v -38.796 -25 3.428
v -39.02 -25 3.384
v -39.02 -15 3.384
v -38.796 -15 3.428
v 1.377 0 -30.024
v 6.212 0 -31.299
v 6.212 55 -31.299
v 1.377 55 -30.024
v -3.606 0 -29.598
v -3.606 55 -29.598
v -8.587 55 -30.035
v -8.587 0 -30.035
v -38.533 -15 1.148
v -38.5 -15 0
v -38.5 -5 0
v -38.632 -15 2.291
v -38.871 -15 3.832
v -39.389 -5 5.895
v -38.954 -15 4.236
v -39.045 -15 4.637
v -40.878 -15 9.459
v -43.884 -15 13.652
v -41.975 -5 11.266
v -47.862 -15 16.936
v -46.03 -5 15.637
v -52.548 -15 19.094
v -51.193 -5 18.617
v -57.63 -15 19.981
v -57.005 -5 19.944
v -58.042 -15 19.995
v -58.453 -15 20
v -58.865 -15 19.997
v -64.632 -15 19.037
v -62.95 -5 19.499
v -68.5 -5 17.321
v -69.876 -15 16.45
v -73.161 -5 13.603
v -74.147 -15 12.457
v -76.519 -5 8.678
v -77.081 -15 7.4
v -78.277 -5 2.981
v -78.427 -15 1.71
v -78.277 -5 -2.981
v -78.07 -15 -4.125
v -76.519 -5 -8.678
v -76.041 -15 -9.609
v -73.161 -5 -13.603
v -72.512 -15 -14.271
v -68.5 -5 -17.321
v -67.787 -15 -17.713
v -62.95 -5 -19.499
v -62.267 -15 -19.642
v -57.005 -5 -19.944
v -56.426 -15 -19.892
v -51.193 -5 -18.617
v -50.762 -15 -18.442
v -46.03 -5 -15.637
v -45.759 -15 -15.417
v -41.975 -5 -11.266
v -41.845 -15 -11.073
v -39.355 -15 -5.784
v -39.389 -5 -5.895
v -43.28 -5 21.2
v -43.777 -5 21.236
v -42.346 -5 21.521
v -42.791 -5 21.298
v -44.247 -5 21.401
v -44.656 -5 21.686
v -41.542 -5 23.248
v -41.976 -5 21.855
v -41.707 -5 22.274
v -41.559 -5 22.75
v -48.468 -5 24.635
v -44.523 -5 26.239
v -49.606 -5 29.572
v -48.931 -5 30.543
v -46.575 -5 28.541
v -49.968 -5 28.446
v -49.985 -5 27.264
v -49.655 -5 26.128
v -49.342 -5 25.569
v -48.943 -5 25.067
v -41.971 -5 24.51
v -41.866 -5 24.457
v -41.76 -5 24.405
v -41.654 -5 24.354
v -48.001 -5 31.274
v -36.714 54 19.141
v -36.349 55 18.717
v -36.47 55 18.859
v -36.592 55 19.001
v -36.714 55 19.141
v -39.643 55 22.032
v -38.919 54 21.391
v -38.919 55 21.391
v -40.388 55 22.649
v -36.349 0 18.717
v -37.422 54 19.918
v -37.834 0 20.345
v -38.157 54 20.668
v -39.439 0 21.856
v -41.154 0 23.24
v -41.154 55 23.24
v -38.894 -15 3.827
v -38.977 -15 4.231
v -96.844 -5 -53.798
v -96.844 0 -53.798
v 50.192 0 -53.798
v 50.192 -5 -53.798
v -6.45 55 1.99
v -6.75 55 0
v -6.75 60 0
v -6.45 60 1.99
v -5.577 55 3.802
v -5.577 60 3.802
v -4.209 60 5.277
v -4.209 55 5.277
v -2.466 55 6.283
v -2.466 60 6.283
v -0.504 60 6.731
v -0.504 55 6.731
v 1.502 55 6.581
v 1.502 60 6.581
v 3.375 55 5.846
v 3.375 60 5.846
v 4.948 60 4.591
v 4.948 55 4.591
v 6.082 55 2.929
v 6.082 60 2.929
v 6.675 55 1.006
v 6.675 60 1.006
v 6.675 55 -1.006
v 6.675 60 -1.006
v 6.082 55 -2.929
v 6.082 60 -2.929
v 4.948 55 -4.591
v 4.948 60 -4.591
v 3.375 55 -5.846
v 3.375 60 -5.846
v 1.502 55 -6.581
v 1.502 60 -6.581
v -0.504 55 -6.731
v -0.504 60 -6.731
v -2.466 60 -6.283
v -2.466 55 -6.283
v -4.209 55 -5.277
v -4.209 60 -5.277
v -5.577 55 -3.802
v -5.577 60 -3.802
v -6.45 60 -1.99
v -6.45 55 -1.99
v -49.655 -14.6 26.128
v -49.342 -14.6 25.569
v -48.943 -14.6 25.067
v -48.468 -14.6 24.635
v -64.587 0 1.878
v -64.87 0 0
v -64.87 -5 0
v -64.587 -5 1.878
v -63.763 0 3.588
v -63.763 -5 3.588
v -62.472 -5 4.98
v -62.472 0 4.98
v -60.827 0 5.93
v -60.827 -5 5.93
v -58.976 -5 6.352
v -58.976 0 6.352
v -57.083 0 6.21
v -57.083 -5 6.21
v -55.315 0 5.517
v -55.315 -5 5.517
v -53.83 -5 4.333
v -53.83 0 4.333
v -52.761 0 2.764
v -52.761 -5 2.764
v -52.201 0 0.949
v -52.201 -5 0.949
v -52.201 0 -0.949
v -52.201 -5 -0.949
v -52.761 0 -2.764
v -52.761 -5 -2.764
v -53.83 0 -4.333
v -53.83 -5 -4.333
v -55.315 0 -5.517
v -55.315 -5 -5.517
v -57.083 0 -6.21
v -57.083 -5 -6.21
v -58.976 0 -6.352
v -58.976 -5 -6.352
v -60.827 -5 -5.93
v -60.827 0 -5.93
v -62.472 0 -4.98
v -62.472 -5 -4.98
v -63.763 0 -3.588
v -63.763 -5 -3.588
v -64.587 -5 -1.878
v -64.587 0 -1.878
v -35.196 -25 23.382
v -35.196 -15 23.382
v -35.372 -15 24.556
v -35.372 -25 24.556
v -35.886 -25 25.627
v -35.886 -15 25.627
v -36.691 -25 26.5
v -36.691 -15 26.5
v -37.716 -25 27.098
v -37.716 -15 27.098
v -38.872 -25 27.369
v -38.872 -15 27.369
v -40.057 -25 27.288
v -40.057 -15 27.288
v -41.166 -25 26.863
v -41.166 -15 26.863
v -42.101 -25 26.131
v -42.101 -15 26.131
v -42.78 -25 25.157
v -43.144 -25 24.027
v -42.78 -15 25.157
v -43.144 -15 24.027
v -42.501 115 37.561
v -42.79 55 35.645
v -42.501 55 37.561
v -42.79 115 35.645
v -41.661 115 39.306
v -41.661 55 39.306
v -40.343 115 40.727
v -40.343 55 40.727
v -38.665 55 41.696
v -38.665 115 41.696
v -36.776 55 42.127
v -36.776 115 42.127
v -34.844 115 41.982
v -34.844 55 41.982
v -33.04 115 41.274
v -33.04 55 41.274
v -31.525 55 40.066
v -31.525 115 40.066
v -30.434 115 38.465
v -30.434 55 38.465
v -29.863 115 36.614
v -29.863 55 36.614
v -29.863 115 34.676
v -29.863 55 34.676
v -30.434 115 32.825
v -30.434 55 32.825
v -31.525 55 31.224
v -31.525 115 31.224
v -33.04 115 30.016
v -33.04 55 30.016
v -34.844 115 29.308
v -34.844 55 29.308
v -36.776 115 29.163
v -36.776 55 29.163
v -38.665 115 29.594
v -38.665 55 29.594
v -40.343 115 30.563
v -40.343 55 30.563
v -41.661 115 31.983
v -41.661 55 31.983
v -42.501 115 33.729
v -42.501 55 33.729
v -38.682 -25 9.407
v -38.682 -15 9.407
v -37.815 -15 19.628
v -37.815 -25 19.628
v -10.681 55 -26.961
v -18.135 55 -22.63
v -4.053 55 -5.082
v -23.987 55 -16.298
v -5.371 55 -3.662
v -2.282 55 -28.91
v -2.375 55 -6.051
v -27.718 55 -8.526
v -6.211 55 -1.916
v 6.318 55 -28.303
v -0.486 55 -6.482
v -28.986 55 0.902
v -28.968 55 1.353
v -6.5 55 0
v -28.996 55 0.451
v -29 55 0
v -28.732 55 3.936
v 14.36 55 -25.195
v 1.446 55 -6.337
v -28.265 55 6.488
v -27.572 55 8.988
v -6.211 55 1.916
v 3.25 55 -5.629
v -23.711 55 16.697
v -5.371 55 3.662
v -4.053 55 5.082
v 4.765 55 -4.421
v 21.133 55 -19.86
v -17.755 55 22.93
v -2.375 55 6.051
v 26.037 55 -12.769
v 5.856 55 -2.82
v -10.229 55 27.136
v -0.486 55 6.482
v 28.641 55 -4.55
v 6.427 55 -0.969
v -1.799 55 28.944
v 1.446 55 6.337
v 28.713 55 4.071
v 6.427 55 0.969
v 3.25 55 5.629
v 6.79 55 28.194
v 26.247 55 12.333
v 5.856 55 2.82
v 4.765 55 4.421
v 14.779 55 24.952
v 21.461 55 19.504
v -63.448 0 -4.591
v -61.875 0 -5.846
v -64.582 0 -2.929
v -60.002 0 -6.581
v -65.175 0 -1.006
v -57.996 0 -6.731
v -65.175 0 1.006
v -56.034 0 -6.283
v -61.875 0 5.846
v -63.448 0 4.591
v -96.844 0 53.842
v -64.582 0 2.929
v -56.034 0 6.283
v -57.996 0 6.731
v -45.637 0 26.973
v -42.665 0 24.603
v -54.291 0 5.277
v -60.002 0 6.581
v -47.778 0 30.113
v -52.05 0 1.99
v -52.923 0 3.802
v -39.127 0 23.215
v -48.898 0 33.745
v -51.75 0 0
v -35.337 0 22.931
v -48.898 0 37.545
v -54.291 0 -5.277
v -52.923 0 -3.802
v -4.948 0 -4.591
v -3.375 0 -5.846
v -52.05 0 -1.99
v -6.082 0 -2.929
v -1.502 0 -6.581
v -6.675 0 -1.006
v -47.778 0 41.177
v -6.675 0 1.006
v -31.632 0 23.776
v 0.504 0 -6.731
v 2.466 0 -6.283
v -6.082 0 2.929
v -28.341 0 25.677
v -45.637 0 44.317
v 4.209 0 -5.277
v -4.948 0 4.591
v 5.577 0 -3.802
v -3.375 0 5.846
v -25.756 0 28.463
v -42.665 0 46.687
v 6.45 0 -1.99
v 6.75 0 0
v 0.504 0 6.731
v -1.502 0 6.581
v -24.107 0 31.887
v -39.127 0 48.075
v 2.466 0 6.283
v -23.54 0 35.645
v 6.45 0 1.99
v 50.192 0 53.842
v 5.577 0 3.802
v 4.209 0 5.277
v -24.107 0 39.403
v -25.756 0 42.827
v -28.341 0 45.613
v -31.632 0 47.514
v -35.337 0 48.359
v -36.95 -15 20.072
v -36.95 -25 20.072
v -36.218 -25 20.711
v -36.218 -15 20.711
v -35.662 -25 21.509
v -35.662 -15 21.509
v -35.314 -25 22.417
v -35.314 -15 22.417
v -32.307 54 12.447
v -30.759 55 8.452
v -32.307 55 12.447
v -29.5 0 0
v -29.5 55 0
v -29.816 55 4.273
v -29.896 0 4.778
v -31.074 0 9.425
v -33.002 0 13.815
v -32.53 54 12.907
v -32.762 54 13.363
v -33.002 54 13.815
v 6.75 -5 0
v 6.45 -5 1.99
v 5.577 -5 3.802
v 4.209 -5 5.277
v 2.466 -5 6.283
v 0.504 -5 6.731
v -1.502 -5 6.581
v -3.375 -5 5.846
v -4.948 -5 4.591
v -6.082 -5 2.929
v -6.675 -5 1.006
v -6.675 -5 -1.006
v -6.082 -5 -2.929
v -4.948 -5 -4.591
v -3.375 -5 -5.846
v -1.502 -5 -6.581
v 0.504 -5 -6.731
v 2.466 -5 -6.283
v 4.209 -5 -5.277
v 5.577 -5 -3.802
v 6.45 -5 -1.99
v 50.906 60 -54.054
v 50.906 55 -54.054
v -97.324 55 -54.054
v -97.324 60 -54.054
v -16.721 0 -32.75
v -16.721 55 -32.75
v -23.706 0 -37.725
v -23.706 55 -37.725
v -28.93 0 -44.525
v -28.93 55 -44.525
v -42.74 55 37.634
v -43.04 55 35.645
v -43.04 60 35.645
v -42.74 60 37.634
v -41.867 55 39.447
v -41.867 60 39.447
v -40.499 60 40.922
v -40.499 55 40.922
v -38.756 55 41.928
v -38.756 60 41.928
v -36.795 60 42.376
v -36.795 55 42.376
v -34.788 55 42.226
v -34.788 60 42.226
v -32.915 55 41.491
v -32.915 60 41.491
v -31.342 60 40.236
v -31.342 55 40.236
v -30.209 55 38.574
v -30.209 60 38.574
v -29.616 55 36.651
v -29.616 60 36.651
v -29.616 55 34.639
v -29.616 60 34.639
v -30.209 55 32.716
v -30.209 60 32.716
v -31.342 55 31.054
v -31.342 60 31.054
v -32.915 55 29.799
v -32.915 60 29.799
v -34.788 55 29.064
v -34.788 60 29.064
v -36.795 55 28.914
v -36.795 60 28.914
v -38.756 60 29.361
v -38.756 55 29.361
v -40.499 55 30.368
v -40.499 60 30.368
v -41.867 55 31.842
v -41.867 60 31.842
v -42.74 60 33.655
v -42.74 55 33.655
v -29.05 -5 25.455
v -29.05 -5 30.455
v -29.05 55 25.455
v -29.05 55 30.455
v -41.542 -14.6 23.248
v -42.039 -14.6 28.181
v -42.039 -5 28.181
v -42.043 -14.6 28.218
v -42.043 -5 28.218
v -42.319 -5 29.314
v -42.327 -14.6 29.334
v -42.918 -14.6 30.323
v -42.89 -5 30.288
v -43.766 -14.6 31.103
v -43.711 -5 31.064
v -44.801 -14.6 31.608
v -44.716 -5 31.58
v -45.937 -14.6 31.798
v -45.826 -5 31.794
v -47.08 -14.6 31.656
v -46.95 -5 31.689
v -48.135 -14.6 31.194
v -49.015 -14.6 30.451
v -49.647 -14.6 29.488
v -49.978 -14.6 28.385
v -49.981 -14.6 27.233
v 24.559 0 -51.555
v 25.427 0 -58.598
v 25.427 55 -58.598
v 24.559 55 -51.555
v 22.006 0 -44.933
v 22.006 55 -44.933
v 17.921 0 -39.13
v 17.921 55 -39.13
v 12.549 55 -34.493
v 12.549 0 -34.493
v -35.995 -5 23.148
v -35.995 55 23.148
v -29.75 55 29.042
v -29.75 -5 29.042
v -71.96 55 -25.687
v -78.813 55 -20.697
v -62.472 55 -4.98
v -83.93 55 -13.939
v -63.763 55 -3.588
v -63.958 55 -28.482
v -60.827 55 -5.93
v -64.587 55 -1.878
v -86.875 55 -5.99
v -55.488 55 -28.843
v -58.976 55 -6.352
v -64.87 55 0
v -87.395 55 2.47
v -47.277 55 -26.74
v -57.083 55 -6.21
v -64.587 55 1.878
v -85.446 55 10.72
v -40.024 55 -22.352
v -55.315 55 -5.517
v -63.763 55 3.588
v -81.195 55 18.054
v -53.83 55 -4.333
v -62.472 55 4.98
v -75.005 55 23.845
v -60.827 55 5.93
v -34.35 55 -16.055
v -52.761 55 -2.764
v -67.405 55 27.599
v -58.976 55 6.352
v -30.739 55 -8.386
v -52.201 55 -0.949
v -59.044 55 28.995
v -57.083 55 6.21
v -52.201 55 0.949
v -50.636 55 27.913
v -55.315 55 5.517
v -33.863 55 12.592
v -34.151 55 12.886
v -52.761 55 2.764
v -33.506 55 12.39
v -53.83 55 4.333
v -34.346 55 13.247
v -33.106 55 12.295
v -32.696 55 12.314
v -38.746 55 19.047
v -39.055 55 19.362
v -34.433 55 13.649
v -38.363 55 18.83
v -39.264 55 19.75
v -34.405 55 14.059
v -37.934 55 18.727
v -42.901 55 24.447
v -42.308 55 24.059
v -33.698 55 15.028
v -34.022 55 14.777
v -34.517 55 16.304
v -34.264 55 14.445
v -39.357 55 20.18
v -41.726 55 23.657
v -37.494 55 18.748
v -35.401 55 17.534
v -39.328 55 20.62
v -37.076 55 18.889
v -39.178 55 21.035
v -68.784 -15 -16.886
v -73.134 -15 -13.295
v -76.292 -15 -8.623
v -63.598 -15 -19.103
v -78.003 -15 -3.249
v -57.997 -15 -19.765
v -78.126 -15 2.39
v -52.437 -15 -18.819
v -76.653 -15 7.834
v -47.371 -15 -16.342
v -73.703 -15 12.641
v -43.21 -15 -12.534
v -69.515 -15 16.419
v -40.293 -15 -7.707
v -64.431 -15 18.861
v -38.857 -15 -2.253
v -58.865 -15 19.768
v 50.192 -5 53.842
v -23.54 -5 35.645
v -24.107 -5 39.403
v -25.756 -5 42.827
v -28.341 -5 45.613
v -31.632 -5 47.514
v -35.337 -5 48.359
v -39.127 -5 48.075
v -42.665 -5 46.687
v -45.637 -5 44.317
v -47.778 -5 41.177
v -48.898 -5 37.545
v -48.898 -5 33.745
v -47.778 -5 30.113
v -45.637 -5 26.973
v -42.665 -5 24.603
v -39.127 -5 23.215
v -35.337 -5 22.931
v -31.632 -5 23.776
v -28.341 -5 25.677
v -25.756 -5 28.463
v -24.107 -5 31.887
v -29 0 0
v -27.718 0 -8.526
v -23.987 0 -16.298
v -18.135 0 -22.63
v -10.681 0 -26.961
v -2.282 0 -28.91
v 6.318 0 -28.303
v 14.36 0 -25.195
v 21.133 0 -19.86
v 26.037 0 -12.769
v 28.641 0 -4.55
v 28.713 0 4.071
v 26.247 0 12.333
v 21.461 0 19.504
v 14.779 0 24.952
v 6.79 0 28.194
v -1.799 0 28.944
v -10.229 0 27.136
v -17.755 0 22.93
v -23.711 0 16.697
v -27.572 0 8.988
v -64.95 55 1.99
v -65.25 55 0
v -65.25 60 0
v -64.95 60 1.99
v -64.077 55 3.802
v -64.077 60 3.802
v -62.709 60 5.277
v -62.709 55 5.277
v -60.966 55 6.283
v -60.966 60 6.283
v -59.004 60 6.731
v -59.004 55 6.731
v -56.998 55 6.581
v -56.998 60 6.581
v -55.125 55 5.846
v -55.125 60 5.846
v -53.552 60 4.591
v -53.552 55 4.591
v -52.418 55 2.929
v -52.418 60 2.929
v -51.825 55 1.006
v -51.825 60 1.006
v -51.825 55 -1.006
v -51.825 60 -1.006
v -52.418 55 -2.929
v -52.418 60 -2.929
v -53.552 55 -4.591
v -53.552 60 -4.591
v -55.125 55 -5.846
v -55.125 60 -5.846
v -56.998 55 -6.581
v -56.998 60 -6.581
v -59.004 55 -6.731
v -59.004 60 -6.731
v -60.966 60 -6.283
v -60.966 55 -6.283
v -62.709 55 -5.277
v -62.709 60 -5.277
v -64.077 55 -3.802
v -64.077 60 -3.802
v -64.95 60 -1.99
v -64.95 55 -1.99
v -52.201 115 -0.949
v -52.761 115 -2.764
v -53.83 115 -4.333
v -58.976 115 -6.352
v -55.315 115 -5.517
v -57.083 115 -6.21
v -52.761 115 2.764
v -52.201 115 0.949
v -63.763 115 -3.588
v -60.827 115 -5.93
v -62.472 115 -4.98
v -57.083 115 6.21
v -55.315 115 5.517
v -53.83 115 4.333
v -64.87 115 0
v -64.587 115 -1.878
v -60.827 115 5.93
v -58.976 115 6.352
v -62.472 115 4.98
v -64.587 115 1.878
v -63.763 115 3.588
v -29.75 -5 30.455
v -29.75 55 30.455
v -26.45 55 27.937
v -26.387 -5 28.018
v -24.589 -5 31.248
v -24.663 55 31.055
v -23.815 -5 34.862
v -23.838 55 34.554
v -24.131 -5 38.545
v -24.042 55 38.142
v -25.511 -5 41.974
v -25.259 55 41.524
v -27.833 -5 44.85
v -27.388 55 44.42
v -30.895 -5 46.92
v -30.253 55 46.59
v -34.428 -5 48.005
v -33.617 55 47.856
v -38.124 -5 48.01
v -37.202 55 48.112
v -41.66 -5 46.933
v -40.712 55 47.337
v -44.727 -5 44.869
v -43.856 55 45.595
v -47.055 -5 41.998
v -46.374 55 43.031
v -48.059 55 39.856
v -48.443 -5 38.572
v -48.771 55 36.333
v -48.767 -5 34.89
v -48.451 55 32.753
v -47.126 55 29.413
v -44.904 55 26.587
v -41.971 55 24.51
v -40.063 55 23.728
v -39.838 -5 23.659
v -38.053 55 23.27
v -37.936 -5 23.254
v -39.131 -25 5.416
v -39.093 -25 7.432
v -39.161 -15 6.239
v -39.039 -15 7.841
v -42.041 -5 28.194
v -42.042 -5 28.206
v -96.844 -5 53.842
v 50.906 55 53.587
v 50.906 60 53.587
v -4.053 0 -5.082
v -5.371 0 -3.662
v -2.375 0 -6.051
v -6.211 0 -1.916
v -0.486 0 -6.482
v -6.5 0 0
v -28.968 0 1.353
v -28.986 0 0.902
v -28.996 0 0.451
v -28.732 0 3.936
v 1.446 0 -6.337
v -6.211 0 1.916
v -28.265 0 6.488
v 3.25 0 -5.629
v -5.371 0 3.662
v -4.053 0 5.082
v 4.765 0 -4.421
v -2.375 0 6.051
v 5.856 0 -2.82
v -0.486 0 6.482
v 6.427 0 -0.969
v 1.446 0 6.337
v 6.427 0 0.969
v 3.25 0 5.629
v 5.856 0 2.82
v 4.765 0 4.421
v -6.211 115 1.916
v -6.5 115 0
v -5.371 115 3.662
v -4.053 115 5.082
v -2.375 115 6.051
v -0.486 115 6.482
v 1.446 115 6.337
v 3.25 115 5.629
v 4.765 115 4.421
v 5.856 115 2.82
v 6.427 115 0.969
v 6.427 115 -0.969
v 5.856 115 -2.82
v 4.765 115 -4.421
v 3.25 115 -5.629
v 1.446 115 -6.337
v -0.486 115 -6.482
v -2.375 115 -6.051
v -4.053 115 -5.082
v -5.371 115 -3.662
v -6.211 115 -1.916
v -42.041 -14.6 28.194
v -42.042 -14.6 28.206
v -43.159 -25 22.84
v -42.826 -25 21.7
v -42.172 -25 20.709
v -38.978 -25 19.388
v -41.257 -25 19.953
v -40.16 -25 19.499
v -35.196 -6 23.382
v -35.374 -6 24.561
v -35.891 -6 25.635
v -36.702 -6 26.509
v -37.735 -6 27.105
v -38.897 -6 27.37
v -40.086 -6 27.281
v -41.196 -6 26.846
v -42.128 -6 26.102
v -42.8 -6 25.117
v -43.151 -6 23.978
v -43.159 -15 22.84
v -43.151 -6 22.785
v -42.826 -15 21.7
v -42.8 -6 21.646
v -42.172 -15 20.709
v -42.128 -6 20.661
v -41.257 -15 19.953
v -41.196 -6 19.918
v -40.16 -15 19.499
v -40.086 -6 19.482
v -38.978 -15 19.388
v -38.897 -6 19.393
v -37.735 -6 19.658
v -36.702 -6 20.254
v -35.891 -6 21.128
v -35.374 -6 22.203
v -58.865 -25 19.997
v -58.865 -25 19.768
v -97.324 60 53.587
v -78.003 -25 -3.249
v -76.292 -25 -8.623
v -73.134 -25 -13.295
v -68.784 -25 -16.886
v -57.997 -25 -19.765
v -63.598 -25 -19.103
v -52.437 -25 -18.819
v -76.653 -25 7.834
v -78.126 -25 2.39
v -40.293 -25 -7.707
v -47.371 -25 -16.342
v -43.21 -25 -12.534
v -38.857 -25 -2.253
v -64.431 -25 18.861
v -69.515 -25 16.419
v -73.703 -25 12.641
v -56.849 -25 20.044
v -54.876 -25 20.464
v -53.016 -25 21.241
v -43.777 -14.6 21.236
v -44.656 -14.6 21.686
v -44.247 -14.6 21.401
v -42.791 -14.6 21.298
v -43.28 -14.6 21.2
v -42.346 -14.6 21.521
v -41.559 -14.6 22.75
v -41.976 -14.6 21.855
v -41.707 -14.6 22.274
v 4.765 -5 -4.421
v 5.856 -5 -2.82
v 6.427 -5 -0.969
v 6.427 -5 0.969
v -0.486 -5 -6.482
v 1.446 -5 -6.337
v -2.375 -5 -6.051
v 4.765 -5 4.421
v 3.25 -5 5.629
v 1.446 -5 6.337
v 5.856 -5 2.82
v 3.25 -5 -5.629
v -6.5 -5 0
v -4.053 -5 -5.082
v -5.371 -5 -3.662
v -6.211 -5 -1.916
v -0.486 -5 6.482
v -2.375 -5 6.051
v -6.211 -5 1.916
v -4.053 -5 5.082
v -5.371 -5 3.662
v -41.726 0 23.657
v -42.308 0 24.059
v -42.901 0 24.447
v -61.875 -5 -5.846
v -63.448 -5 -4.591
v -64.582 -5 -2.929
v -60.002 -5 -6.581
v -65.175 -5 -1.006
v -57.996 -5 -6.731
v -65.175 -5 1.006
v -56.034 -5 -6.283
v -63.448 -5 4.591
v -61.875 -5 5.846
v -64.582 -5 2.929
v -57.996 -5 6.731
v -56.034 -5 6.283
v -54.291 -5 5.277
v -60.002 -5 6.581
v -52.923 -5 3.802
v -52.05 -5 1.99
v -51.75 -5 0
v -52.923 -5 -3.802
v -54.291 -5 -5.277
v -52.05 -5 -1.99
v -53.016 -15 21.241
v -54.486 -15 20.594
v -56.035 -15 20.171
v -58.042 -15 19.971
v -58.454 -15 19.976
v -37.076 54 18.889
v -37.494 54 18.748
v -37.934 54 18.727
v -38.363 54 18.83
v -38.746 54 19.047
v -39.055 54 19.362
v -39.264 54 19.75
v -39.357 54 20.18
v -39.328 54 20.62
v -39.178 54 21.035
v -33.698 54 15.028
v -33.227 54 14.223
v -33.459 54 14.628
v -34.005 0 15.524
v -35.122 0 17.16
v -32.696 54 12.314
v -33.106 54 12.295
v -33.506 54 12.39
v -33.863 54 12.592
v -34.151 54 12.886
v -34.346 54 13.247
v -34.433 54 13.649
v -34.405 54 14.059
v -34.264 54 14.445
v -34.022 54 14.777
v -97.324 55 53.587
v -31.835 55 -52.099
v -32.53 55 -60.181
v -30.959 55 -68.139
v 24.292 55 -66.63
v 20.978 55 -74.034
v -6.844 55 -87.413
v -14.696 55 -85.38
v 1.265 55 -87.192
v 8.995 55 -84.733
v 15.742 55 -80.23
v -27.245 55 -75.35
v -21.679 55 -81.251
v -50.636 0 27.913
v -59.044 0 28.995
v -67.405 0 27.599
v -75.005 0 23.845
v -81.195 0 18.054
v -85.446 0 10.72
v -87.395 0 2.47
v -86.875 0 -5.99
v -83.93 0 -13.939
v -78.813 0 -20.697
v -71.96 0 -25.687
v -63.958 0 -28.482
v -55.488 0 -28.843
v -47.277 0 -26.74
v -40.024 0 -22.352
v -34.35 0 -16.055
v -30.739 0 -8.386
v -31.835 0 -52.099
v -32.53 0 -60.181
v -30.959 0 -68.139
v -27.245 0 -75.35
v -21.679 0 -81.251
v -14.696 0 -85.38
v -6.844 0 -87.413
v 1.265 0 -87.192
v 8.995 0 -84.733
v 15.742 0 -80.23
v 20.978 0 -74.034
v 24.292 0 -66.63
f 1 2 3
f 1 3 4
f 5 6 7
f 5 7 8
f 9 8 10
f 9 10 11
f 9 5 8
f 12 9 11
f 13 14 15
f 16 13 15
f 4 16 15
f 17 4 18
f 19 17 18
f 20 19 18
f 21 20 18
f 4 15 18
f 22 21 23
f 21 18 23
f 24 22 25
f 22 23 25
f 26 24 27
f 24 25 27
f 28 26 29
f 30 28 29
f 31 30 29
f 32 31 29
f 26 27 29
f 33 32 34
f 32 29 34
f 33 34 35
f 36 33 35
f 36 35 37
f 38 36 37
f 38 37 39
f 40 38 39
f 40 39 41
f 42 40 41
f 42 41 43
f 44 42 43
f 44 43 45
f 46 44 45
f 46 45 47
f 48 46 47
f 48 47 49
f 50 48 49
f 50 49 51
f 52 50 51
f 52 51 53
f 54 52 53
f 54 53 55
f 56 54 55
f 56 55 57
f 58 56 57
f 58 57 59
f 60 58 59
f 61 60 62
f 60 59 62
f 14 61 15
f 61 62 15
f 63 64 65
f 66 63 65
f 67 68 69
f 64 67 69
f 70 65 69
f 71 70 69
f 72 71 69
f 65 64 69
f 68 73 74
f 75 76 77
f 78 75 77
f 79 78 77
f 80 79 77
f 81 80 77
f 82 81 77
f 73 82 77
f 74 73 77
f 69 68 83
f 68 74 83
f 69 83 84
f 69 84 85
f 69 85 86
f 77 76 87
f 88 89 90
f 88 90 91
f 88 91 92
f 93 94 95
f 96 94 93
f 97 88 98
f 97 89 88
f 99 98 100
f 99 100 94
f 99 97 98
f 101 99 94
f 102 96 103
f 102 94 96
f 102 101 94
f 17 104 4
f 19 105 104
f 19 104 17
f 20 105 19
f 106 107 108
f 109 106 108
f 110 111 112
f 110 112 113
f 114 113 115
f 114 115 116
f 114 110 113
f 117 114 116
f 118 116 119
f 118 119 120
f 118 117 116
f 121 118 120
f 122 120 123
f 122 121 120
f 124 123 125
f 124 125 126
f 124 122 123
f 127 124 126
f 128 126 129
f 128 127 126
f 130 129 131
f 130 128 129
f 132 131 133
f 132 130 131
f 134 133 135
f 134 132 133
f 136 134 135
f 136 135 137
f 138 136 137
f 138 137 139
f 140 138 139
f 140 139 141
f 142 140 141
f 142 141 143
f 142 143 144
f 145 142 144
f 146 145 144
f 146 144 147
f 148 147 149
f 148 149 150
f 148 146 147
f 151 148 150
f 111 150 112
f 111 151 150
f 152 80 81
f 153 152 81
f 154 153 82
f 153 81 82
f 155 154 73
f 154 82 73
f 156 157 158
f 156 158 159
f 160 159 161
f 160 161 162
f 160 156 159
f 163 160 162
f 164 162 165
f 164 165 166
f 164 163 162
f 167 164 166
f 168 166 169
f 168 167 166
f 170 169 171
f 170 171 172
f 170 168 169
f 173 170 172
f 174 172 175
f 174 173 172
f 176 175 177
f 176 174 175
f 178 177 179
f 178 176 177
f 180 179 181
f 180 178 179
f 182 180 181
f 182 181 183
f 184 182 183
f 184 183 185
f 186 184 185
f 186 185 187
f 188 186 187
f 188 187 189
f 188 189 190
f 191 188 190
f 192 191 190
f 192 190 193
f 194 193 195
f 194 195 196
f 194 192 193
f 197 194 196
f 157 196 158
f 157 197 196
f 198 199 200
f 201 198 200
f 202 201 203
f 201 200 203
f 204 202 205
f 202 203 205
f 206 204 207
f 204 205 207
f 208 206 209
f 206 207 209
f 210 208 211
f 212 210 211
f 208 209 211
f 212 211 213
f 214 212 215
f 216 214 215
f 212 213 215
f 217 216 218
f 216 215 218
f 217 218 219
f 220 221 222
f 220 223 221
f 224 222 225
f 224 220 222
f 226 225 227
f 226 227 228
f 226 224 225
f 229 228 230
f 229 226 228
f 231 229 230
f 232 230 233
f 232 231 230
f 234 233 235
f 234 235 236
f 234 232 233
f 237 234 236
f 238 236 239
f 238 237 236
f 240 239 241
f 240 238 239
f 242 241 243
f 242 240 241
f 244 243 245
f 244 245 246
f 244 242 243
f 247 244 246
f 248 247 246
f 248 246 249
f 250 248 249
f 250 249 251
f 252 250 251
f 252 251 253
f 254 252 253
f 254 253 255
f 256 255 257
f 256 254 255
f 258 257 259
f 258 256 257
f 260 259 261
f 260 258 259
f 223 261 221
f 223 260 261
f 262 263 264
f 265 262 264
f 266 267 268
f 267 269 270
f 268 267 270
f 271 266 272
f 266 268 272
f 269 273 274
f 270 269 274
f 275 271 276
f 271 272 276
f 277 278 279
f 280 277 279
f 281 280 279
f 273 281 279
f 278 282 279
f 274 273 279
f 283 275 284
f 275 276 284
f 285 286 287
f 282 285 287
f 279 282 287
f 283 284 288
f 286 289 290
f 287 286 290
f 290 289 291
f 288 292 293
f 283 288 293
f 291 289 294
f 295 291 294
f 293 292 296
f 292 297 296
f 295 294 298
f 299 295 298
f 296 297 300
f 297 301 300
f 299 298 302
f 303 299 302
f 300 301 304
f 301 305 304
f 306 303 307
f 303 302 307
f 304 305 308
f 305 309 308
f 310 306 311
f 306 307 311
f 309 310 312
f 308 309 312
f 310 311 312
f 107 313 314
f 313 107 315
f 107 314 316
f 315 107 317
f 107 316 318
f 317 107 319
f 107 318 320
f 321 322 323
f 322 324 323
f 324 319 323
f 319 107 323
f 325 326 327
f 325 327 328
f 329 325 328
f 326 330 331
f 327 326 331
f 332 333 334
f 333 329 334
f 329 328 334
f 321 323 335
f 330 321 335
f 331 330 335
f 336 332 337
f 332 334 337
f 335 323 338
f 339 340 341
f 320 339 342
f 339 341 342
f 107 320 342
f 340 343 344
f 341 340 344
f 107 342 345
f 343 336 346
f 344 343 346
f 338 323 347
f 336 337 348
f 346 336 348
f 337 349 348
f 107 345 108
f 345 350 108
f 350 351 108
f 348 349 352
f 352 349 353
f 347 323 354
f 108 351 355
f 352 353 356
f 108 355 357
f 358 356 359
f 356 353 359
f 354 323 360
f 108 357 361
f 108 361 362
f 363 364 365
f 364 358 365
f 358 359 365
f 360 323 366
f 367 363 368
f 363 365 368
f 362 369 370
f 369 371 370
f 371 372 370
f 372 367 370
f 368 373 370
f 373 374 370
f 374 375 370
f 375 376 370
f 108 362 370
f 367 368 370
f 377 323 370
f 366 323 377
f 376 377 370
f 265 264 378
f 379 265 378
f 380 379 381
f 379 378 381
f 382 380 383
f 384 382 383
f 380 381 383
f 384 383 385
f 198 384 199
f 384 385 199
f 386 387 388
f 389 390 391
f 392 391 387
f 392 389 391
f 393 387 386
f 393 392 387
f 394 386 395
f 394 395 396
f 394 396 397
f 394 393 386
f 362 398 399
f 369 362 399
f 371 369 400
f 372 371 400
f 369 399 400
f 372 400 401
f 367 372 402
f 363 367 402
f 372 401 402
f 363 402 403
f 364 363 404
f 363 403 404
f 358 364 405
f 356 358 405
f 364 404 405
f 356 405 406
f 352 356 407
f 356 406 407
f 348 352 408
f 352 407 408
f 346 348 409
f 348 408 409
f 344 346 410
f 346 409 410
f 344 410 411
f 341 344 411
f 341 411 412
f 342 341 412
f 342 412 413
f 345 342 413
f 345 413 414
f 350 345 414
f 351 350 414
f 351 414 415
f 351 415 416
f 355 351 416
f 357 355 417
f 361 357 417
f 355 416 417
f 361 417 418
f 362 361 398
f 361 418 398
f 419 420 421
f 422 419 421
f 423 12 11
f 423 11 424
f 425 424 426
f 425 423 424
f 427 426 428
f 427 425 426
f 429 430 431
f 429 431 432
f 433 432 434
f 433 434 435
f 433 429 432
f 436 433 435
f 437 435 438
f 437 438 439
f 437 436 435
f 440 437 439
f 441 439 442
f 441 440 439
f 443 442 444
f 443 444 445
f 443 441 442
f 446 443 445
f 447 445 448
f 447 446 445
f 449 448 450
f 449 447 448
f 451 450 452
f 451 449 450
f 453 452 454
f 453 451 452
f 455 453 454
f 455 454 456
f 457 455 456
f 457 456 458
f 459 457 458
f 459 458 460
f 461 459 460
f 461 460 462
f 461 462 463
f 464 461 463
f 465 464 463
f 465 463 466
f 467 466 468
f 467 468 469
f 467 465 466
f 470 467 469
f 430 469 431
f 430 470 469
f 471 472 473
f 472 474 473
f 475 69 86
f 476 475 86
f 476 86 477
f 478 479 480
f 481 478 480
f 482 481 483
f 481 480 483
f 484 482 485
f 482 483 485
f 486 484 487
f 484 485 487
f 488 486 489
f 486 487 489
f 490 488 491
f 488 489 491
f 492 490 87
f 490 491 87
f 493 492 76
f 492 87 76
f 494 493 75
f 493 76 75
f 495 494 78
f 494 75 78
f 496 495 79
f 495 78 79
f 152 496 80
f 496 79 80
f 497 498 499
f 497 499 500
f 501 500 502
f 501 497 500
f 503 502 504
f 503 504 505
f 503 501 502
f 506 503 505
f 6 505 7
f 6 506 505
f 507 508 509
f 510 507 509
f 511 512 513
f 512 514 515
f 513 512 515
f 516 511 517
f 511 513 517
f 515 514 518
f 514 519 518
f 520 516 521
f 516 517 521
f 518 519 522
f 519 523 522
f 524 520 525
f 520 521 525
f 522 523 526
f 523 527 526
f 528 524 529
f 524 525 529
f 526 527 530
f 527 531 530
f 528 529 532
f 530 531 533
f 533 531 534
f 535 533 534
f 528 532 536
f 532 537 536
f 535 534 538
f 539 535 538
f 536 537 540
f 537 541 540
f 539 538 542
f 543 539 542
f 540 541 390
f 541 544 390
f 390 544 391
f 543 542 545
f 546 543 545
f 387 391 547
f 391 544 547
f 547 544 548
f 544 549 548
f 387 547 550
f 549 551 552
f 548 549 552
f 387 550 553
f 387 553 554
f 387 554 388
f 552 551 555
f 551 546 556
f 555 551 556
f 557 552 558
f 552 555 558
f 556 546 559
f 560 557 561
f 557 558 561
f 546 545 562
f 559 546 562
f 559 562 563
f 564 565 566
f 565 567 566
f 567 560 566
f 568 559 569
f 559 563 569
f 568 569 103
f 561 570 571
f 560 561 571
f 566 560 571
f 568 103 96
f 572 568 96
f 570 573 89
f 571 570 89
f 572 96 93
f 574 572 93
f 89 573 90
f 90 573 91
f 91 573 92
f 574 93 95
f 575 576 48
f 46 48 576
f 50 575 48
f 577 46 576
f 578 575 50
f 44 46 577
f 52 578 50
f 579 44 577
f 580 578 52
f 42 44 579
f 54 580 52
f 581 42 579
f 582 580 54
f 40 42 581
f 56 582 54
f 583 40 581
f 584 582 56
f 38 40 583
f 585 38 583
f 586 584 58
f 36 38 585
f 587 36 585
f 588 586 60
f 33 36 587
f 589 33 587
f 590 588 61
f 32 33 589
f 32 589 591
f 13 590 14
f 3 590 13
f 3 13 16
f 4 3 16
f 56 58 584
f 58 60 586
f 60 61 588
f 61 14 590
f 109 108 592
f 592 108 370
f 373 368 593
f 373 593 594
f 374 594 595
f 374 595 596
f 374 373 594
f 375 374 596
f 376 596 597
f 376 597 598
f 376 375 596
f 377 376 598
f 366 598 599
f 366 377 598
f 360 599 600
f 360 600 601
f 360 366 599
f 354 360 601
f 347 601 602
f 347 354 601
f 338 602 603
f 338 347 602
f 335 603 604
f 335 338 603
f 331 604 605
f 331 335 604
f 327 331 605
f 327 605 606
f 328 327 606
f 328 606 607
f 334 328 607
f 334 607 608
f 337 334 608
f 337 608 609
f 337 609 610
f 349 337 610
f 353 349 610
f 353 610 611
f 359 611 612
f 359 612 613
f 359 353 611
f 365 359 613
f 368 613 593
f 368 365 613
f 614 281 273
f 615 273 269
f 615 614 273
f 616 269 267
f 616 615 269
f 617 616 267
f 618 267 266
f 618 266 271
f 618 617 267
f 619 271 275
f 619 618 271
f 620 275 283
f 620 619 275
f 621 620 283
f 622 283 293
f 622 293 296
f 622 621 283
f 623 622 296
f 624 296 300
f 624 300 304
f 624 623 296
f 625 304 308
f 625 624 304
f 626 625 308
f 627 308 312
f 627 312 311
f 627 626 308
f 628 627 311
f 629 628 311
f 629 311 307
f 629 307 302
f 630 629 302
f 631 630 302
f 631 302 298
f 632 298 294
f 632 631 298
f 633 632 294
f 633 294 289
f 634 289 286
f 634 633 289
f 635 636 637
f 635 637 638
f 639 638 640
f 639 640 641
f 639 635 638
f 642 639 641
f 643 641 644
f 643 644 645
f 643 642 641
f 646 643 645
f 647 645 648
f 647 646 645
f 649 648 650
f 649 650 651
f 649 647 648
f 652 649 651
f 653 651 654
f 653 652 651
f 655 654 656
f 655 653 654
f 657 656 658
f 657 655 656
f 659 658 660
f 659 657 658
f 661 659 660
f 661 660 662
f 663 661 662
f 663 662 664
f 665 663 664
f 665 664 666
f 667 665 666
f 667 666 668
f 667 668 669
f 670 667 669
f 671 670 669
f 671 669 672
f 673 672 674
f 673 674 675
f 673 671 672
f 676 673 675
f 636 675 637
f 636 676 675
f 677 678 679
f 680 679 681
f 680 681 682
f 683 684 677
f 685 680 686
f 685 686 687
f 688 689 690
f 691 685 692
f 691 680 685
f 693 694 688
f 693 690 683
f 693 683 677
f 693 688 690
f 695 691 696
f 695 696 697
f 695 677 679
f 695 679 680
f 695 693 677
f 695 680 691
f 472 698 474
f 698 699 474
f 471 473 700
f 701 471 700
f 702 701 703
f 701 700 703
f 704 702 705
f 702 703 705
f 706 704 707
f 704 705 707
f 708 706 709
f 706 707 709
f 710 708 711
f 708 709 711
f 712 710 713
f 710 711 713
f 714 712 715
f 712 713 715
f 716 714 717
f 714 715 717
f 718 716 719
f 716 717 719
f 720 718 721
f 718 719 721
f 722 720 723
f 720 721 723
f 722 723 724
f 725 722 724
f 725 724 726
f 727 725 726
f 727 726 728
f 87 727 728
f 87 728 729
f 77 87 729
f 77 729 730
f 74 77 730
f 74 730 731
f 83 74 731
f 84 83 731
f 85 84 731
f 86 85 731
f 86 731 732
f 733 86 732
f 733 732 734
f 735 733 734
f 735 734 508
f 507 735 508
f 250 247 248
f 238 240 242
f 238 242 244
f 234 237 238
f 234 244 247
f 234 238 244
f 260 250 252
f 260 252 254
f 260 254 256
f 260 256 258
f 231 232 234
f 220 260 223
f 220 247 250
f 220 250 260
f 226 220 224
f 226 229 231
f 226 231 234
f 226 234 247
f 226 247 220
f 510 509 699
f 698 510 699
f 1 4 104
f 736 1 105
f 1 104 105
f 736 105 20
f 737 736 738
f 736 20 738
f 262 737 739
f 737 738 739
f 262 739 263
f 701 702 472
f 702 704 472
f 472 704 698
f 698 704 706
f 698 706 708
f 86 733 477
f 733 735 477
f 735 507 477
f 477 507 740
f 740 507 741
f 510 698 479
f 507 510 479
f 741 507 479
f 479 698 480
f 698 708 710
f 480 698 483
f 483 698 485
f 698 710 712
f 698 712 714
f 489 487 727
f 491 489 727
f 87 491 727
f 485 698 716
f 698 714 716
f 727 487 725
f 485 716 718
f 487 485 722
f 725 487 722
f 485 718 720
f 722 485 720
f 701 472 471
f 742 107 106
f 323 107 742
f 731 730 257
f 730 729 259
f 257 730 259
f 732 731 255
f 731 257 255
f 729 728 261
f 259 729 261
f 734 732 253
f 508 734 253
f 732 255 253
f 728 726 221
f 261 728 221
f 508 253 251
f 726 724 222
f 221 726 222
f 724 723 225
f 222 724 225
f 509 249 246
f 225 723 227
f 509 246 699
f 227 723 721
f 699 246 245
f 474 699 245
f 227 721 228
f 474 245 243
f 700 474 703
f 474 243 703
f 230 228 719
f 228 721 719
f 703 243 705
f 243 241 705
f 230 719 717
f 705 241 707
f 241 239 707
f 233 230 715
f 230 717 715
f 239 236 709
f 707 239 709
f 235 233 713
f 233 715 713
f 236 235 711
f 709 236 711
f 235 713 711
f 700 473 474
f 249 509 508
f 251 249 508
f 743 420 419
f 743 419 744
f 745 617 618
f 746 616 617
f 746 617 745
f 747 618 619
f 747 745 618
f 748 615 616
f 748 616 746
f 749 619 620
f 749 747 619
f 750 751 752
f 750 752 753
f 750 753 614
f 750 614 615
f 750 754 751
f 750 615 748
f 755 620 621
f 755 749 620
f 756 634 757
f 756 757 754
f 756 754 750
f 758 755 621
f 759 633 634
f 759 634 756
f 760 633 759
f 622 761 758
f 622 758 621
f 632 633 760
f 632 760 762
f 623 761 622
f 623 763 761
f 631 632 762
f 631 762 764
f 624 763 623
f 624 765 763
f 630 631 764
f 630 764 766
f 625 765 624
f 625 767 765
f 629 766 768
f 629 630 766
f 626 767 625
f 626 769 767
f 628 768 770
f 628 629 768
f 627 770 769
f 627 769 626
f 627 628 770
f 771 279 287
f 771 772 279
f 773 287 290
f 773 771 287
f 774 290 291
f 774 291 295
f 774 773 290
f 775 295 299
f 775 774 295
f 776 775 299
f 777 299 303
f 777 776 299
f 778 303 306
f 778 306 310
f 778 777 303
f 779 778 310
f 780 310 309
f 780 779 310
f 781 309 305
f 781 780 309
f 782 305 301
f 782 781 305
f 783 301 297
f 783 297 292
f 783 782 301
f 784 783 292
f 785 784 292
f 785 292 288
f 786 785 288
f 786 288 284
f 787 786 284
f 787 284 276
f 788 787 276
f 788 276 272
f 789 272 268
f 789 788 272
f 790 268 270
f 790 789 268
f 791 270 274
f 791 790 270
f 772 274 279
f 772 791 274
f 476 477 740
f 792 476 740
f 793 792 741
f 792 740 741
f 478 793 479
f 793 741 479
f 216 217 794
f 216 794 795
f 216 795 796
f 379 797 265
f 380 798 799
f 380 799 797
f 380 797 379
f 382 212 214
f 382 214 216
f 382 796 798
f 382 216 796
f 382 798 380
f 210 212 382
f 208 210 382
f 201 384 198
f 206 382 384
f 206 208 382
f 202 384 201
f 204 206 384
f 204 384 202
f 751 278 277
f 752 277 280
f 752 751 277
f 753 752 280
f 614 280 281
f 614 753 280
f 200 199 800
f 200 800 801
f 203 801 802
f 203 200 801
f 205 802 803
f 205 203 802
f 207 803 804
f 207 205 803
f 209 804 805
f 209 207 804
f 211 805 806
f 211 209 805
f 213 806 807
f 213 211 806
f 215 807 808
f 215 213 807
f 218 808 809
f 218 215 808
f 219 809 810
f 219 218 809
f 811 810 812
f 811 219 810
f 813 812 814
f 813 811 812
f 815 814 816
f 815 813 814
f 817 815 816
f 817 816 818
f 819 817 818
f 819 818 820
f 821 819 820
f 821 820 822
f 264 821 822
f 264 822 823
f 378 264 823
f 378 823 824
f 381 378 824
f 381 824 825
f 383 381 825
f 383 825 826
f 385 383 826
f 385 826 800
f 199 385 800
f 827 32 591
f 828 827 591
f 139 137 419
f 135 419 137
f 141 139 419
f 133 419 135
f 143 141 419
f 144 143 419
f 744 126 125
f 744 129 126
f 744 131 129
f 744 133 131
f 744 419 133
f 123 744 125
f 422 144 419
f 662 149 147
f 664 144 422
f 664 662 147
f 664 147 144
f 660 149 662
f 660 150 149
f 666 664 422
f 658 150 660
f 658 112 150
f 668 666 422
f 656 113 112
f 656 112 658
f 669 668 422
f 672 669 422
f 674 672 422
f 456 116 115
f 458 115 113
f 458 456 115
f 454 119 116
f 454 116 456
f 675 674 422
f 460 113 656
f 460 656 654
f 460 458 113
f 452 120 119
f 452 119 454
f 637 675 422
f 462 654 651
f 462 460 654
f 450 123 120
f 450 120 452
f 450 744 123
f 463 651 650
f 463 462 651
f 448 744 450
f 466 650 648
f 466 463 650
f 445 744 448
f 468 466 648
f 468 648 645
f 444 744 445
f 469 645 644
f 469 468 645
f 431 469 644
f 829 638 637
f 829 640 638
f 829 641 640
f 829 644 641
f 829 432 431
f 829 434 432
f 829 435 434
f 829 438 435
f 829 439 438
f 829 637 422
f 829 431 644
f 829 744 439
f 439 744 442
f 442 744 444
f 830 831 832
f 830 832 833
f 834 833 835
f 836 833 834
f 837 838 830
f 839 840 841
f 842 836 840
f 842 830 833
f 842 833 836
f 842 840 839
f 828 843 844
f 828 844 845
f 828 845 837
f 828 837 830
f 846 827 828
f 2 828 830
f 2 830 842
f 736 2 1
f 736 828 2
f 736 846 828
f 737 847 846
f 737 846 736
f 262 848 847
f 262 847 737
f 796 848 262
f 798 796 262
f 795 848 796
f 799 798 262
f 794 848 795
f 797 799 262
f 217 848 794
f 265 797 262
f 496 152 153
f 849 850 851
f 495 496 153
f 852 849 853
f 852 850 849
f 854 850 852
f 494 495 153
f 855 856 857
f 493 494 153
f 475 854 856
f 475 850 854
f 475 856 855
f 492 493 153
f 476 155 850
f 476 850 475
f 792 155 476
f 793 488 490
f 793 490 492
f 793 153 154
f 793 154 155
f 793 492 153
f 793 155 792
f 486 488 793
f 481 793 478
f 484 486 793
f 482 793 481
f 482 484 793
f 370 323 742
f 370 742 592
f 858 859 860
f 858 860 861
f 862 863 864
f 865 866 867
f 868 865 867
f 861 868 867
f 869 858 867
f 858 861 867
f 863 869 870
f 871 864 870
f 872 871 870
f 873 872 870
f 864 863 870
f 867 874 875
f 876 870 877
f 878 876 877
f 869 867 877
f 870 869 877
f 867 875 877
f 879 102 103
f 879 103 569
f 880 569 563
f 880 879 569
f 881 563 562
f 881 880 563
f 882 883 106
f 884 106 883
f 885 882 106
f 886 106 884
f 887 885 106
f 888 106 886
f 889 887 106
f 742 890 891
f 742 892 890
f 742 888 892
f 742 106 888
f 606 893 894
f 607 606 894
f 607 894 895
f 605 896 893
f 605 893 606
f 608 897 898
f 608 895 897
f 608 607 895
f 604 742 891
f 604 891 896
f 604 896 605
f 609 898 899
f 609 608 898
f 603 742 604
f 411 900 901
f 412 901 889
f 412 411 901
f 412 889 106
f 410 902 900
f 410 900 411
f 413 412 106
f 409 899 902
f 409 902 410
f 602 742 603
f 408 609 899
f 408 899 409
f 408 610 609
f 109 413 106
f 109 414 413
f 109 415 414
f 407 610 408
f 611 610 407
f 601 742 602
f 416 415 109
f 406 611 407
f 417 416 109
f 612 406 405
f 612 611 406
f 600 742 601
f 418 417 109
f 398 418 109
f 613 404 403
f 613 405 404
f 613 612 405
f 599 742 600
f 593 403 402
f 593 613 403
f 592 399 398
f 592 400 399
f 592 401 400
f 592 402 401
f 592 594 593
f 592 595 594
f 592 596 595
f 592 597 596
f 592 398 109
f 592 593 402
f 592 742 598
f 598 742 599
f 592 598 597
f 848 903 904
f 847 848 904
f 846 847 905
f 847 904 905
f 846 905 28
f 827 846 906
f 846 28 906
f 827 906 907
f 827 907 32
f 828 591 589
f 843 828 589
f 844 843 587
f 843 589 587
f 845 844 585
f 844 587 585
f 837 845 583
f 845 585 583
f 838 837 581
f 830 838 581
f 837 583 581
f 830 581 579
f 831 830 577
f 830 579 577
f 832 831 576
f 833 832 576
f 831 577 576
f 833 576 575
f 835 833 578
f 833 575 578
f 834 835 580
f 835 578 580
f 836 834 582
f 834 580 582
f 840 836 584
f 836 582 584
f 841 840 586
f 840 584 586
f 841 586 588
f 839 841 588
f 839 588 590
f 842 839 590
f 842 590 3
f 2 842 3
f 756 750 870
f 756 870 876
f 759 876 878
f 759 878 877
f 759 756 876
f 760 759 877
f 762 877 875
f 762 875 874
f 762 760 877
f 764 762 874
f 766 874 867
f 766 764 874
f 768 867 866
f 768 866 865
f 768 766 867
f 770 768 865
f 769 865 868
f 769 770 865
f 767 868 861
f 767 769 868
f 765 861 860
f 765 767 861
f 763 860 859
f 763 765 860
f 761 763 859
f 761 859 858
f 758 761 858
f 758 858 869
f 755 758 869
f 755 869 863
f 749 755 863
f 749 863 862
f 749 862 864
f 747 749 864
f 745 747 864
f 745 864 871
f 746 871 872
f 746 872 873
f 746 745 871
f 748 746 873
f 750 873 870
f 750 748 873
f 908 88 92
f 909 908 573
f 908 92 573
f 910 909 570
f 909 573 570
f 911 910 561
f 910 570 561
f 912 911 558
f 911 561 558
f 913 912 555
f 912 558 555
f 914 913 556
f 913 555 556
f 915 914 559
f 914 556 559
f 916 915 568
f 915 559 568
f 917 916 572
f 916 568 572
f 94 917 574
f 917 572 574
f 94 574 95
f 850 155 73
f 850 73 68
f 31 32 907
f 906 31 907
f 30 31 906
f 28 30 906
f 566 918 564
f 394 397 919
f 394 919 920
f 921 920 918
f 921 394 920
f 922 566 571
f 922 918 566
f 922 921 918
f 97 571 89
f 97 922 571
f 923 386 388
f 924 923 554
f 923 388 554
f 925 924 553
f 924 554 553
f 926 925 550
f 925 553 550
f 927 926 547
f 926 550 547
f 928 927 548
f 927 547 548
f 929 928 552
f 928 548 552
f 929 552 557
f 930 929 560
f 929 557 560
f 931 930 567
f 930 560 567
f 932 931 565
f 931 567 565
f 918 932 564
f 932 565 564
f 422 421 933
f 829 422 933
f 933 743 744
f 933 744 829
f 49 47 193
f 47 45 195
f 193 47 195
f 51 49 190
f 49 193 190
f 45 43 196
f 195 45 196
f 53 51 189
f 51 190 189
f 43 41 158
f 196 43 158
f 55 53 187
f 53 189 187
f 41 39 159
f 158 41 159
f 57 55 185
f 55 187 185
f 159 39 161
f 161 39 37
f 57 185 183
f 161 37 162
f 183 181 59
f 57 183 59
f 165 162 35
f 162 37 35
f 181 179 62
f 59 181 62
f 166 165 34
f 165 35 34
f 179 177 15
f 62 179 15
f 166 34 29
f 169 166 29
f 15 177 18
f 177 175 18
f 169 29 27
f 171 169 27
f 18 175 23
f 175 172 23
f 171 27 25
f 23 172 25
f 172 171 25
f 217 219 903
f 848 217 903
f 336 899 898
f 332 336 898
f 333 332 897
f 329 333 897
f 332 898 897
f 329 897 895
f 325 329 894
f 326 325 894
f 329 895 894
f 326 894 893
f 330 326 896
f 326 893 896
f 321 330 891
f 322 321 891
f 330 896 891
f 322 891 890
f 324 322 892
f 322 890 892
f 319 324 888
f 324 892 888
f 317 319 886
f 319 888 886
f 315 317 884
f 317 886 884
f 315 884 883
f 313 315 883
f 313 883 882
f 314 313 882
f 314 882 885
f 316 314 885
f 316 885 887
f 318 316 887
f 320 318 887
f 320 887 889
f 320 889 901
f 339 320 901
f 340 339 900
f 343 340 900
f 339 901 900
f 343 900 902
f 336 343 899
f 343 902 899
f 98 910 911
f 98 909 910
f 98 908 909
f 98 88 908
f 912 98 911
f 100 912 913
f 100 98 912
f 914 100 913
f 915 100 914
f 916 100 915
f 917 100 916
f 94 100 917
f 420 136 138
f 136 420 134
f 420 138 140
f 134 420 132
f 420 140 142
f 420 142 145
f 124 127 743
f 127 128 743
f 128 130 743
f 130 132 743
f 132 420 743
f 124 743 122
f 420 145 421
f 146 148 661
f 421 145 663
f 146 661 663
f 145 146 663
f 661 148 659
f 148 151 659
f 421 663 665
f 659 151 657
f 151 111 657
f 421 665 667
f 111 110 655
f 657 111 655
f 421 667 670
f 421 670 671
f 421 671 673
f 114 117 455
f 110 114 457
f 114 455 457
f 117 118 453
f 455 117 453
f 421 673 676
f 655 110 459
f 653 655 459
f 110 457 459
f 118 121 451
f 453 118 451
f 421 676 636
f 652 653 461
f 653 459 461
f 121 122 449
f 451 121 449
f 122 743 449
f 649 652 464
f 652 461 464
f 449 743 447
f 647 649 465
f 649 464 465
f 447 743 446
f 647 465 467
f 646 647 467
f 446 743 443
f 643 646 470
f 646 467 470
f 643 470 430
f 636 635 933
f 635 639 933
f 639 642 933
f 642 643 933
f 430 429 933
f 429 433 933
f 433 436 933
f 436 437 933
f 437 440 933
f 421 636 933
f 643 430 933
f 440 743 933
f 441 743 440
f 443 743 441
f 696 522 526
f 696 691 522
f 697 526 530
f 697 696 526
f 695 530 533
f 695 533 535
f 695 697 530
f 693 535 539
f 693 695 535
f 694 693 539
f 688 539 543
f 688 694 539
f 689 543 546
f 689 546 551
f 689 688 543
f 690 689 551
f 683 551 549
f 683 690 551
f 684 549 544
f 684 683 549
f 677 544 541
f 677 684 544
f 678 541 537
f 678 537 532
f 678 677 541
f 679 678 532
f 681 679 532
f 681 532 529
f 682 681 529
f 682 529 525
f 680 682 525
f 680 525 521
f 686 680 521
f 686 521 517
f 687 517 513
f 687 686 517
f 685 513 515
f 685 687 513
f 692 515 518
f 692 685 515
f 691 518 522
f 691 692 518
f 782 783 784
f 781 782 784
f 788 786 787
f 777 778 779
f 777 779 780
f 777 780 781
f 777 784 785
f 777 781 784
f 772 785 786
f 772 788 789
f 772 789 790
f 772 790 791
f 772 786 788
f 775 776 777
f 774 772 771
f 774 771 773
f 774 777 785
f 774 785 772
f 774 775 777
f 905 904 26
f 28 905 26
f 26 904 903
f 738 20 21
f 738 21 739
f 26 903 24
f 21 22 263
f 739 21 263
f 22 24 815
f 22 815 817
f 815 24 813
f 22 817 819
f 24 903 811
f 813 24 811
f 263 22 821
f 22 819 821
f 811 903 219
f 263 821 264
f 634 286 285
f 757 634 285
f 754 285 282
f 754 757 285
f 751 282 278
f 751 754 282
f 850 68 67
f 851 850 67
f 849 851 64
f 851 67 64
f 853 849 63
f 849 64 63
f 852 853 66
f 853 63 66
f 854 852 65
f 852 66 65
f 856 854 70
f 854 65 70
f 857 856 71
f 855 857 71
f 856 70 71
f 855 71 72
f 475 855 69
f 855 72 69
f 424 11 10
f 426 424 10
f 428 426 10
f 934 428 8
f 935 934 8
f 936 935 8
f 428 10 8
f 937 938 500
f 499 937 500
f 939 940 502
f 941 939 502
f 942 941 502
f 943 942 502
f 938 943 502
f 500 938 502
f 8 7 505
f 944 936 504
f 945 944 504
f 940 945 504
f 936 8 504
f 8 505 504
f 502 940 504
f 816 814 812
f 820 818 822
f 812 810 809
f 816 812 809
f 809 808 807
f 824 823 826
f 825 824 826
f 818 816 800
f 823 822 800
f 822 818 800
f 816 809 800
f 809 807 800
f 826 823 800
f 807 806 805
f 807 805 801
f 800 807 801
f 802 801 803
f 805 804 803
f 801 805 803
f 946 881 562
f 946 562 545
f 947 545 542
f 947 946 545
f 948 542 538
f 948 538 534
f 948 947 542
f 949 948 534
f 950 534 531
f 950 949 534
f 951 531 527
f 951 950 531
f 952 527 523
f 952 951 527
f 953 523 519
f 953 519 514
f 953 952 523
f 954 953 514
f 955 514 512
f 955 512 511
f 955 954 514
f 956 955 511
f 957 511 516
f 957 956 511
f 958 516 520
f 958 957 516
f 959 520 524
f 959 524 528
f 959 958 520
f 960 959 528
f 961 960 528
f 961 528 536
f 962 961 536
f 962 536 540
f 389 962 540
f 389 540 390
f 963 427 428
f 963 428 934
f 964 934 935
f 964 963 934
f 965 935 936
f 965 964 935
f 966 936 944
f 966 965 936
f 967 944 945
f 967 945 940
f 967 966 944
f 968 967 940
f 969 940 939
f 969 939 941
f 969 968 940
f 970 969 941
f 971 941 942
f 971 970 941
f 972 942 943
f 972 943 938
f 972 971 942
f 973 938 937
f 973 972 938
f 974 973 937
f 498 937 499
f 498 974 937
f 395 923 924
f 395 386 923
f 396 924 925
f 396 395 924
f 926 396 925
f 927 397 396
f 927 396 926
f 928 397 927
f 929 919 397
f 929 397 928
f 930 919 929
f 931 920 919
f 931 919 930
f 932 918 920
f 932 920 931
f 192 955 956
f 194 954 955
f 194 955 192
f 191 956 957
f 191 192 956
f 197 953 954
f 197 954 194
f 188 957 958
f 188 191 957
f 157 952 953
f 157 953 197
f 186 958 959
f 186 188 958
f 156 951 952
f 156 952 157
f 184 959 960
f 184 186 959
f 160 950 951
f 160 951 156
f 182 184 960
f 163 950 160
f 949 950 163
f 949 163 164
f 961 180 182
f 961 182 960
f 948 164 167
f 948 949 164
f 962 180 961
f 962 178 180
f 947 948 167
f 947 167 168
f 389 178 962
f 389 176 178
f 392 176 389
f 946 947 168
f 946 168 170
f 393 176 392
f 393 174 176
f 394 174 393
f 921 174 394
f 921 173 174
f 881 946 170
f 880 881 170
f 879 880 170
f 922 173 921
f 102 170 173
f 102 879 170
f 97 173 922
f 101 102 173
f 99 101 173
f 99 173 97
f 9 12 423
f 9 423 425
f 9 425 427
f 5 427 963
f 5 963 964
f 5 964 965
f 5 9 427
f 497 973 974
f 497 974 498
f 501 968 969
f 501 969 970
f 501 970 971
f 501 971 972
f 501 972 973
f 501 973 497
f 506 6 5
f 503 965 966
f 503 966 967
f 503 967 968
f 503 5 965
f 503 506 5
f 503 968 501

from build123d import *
from build123d import SkipClean  # not in build123d's __all__

# Parameters (mm, degrees)
F1_DEPTH  = 55
F2_DEPTH  = 55
F3_DEPTH  = 5
F4_W      = 147.0356285572
F4_H      = 107.6404266059
F4_R      = 12.75
F5_DEPTH  = 5
F6_R      = 6.5
F7_DEPTH  = 60
F6_R_2    = 6.37
F8_R      = 6.75
F8_R_2    = 6.5
F9_DEPTH  = 5
F10_W     = 148.2294239104
F10_H     = 107.6404303312
F10_R     = 29
F10_R_2   = 6.75
F11_DEPTH = 5
F12_R     = 20
F13_DEPTH = 10
F15_DEPTH = 9.6
F16_R     = 1.4667338037
F16_R_2   = 1.575645526
F17_DEPTH = 1
F19_DEPTH = 10
F20_R     = 4
F21_DEPTH = 19


# Not quite as in the source:
# - a feature names something its author has since deleted; it is built from what else it names


with BuildPart() as f1:
    # F0 (on Front) → F1 (new body)
    with BuildSketch(Plane.XZ):
        with BuildLine():
            ThreePointArc((-41.1536252148, 23.2401222417), (-42.0160454202, 23.8595733703), (-42.9005648719, 24.4470371146))
            ThreePointArc((-42.9005648719, 24.4470371146), (-83.9301358502, -13.9394472861), (-29.5, 0))
            ThreePointArc((-29.5, 0), (-30.3890739875, 7.1257167163), (-33.0017819808, 13.8145169241))
            ThreePointArc((-33.0017819808, 13.8145169241), (-34.5495422962, 16.3516230319), (-36.348838503, 18.7169988068))
            ThreePointArc((-36.348838503, 18.7169988068), (-38.6221604672, 21.1156694307), (-41.1536252148, 23.2401222417))
        make_face()
    extrude(amount=-F1_DEPTH)

    # F6 (on face) → F7, piece 2 (join, symmetric)
    with BuildSketch(Plane(origin=(0, 55, 0), x_dir=(-1, 0, 0), z_dir=(0, 1, 0))):
        with Locations((58.5, 0)):
            Circle(F6_R_2)
    extrude(amount=F7_DEPTH, both=True)

    # F12 (on face) → F13 (join)
    with BuildSketch(Plane.XZ.offset(5)):
        with Locations((-58.5, 0)):
            Circle(F12_R)
    extrude(amount=F13_DEPTH)

    # F16 (on face) → F17 (cut)
    with BuildSketch(Plane(origin=(0, 55, 0), x_dir=(-1, 0, 0), z_dir=(0, 1, 0))):
        with Locations((32.9697545245, 13.7552377646)):
            Circle(F16_R)
        with Locations((37.7860717411, 20.2961369745)):
            Circle(F16_R_2)
    extrude(amount=-F17_DEPTH, mode=Mode.SUBTRACT)

    # F18 (on face) → F19 (join)
    with BuildSketch(Plane.XZ.offset(15)):
        with BuildLine():
            Line((-58.8650048174, 19.9966690097), (-58.8650048174, 19.7679851447))
            ThreePointArc((-58.8650048174, 19.7679851447), (-71.0876028348, -15.2465969997), (-39.0204476237, 3.3843026488))
            Line((-39.0204476237, 3.3843026488), (-38.7958999198, 3.4275997474))
            ThreePointArc((-38.7958999198, 3.4275997474), (-39.158784575, 6.4252112319), (-38.6819540845, 9.4068202888))
            Line((-38.6819540845, 9.4068202888), (-37.8152522193, 19.6275492174))
            ThreePointArc((-37.8152522193, 19.6275492174), (-41.7427232808, 20.2970691325), (-43.1437283838, 24.0267434556))
            Line((-43.1437283838, 24.0267434556), (-53.0155028424, 21.2406097555))
            ThreePointArc((-53.0155028424, 21.2406097555), (-55.852904996, 20.207890576), (-58.8650048174, 19.9966690097))
        make_face()
        with BuildLine():
            ThreePointArc((-35.1960889101, 23.3816523105), (-38.8724825867, 27.3685406896), (-43.1437283838, 24.0267434556))
            ThreePointArc((-43.1437283838, 24.0267434556), (-41.7427232808, 20.2970691325), (-37.8152522193, 19.6275492174))
            ThreePointArc((-37.8152522193, 19.6275492174), (-35.915589957, 21.0929132213), (-35.1960889101, 23.3816523105))
        make_face()
    extrude(amount=F19_DEPTH)

    # F20 (on face) → F21 (join)
    with BuildSketch(Plane.XZ.offset(25)):
        with Locations((-39.1960889101, 23.3816523105)):
            Circle(F20_R)
    with SkipClean():  # cleaning this boolean's faces spoils the solid; the shape is the same uncleaned
        extrude(amount=-F21_DEPTH)


with BuildPart() as f1b:
    # F0 (on Front) → F1, piece 2 (new body)
    with BuildSketch(Plane.XZ):
        with BuildLine():
            ThreePointArc((-28.9684026443, 1.3533839956), (-28.9920995849, 0.676876398), (-29, 0))
            ThreePointArc((-29, 0), (28.6408007806, -4.5502231426), (-27.5721013347, 8.9877265196))
            ThreePointArc((-27.5721013347, 8.9877265196), (-28.5267934404, 5.217476019), (-28.9684026443, 1.3533839956))
        make_face()
    extrude(amount=-F1_DEPTH)

    # F6 (on face) → F7 (join, symmetric)
    with BuildSketch(Plane(origin=(0, 55, 0), x_dir=(-1, 0, 0), z_dir=(0, 1, 0))):
        Circle(F6_R)
    extrude(amount=F7_DEPTH, both=True)


with BuildPart() as f1c:
    # F0 (on Front) → F1, piece 3 (new body)
    with BuildSketch(Plane.XZ):
        with BuildLine():
            ThreePointArc((-8.5874367907, -30.0348162964), (-6.6181195056, -33.6613095975), (-5.9369329363, -37.7314016223))
            ThreePointArc((-5.9369329363, -37.7314016223), (-14.8949027207, -49.7190628601), (-28.9295764486, -44.5251069533))
            ThreePointArc((-28.9295764486, -44.5251069533), (-10.8414991929, -86.6723671252), (25.4269504417, -58.5980080068))
            ThreePointArc((25.4269504417, -58.5980080068), (20.1416741432, -41.9063370372), (6.2123380445, -31.2988104094))
            ThreePointArc((6.2123380445, -31.2988104094), (-1.1052506579, -29.703199328), (-8.5874367907, -30.0348162964))
        make_face()
    extrude(amount=-F1_DEPTH)

    # F0 (on Front) → F2, piece 2 (join)
    with BuildSketch(Plane.XZ):
        with BuildLine():
            ThreePointArc((-28.9295764486, -44.5251069533), (-14.8949027207, -49.7190628601), (-5.9369329363, -37.7314016223))
            ThreePointArc((-5.9369329363, -37.7314016223), (-6.6181195056, -33.6613095975), (-8.5874367907, -30.0348162964))
            ThreePointArc((-8.5874367907, -30.0348162964), (-20.398335202, -34.9778944802), (-28.9295764486, -44.5251069533))
        make_face()
    extrude(amount=-F2_DEPTH)


with BuildPart() as f2:
    # F0 (on Front) → F2 (new body)
    with BuildSketch(Plane.XZ):
        with BuildLine():
            Line((-29.7499911844, 29.0422718972), (-29.7499911844, 30.4551975319))
            Line((-29.7499911844, 30.4551975319), (-29.0499911844, 30.4551975319))
            Line((-29.0499911844, 30.4551975319), (-29.0499911844, 28.7470832982))
            Line((-29.0499911844, 28.7470832982), (-29.0499911844, 25.4551975319))
            ThreePointArc((-29.0499911844, 25.4551975319), (-37.2019757379, 48.111576961), (-41.9707706725, 24.5102003937))
            ThreePointArc((-41.9707706725, 24.5102003937), (-39.0674891647, 23.4573161705), (-35.9946793142, 23.148369049))
            Line((-35.9946793142, 23.148369049), (-29.7499911844, 29.0422718972))
        make_face()
    extrude(amount=-F2_DEPTH)

    # F3 (add): a face of the model
    f3_faces = [f2.faces().sort_by_distance(p)[0] for p in [
        (-36.4766460991, 0, 36.0174252396),
    ]]
    extrude(f3_faces, amount=F3_DEPTH)

    # F6 (on face) → F7, piece 3 (join, symmetric)
    with BuildSketch(Plane(origin=(0, 55, 0), x_dir=(-1, 0, 0), z_dir=(0, 1, 0))):
        with Locations((36.2901888608, 35.6448755251)):
            Circle(F6_R)
    extrude(amount=F7_DEPTH, both=True)

    # F14 (on face) → F15 (join)
    with BuildSketch(Plane.XZ.offset(5)):
        with BuildLine():
            Line((-41.5423475849, 23.2477869574), (-42.039366708, 28.1814121262))
            ThreePointArc((-42.039366708, 28.1814121262), (-42.0411706118, 28.1997414844), (-42.0430588933, 28.2180623422))
            ThreePointArc((-42.0430588933, 28.2180623422), (-47.0802039077, 31.6560257646), (-49.6552624965, 26.1277805045))
            ThreePointArc((-49.6552624965, 26.1277805045), (-49.1521463113, 25.3096121307), (-48.4684965177, 24.6349653021))
            Line((-48.4684965177, 24.6349653021), (-44.6557707015, 21.6855334745))
            ThreePointArc((-44.6557707015, 21.6855334745), (-42.5611405388, 21.3946394228), (-41.5423475849, 23.2477869574))
        make_face()
    extrude(amount=F15_DEPTH)


with BuildPart() as f5:
    # F4 (on face) → F5 (new body)
    with BuildSketch(Plane.XZ):
        with Locations((-23.3261063695, 0.0221710652)):
            Rectangle(F4_W, F4_H)
        with Locations((-36.2901888608, 35.6448755251)):
            Circle(F4_R, mode=Mode.SUBTRACT)
    extrude(amount=F5_DEPTH)

    # F8 (on face) → F9 (cut)
    with BuildSketch(Plane.XZ.offset(5)):
        Circle(F8_R)
        with Locations((-58.5, 0)):
            Circle(F8_R)
        with Locations((-36.2901888608, 35.6448755251)):
            Circle(F8_R_2)
    extrude(amount=-F9_DEPTH, mode=Mode.SUBTRACT)


with BuildPart() as f11:
    # F10 (on face) → F11 (new body)
    with BuildSketch(Plane(origin=(0, 55, 0), x_dir=(-1, 0, 0), z_dir=(0, 1, 0))):
        with Locations((23.2089590281, -0.2336390316)):
            Rectangle(F10_W, F10_H)
        Circle(F10_R, mode=Mode.SUBTRACT)
        with Locations((58.5, 0)):
            Circle(F10_R_2, mode=Mode.SUBTRACT)
        with Locations((36.2901888608, 35.6448755251)):
            Circle(F10_R_2, mode=Mode.SUBTRACT)
        Circle(F10_R)
        Circle(F10_R_2, mode=Mode.SUBTRACT)
    extrude(amount=F11_DEPTH)


solid = Compound([f1.part, f1b.part, f1c.part, f2.part, f5.part, f11.part])
